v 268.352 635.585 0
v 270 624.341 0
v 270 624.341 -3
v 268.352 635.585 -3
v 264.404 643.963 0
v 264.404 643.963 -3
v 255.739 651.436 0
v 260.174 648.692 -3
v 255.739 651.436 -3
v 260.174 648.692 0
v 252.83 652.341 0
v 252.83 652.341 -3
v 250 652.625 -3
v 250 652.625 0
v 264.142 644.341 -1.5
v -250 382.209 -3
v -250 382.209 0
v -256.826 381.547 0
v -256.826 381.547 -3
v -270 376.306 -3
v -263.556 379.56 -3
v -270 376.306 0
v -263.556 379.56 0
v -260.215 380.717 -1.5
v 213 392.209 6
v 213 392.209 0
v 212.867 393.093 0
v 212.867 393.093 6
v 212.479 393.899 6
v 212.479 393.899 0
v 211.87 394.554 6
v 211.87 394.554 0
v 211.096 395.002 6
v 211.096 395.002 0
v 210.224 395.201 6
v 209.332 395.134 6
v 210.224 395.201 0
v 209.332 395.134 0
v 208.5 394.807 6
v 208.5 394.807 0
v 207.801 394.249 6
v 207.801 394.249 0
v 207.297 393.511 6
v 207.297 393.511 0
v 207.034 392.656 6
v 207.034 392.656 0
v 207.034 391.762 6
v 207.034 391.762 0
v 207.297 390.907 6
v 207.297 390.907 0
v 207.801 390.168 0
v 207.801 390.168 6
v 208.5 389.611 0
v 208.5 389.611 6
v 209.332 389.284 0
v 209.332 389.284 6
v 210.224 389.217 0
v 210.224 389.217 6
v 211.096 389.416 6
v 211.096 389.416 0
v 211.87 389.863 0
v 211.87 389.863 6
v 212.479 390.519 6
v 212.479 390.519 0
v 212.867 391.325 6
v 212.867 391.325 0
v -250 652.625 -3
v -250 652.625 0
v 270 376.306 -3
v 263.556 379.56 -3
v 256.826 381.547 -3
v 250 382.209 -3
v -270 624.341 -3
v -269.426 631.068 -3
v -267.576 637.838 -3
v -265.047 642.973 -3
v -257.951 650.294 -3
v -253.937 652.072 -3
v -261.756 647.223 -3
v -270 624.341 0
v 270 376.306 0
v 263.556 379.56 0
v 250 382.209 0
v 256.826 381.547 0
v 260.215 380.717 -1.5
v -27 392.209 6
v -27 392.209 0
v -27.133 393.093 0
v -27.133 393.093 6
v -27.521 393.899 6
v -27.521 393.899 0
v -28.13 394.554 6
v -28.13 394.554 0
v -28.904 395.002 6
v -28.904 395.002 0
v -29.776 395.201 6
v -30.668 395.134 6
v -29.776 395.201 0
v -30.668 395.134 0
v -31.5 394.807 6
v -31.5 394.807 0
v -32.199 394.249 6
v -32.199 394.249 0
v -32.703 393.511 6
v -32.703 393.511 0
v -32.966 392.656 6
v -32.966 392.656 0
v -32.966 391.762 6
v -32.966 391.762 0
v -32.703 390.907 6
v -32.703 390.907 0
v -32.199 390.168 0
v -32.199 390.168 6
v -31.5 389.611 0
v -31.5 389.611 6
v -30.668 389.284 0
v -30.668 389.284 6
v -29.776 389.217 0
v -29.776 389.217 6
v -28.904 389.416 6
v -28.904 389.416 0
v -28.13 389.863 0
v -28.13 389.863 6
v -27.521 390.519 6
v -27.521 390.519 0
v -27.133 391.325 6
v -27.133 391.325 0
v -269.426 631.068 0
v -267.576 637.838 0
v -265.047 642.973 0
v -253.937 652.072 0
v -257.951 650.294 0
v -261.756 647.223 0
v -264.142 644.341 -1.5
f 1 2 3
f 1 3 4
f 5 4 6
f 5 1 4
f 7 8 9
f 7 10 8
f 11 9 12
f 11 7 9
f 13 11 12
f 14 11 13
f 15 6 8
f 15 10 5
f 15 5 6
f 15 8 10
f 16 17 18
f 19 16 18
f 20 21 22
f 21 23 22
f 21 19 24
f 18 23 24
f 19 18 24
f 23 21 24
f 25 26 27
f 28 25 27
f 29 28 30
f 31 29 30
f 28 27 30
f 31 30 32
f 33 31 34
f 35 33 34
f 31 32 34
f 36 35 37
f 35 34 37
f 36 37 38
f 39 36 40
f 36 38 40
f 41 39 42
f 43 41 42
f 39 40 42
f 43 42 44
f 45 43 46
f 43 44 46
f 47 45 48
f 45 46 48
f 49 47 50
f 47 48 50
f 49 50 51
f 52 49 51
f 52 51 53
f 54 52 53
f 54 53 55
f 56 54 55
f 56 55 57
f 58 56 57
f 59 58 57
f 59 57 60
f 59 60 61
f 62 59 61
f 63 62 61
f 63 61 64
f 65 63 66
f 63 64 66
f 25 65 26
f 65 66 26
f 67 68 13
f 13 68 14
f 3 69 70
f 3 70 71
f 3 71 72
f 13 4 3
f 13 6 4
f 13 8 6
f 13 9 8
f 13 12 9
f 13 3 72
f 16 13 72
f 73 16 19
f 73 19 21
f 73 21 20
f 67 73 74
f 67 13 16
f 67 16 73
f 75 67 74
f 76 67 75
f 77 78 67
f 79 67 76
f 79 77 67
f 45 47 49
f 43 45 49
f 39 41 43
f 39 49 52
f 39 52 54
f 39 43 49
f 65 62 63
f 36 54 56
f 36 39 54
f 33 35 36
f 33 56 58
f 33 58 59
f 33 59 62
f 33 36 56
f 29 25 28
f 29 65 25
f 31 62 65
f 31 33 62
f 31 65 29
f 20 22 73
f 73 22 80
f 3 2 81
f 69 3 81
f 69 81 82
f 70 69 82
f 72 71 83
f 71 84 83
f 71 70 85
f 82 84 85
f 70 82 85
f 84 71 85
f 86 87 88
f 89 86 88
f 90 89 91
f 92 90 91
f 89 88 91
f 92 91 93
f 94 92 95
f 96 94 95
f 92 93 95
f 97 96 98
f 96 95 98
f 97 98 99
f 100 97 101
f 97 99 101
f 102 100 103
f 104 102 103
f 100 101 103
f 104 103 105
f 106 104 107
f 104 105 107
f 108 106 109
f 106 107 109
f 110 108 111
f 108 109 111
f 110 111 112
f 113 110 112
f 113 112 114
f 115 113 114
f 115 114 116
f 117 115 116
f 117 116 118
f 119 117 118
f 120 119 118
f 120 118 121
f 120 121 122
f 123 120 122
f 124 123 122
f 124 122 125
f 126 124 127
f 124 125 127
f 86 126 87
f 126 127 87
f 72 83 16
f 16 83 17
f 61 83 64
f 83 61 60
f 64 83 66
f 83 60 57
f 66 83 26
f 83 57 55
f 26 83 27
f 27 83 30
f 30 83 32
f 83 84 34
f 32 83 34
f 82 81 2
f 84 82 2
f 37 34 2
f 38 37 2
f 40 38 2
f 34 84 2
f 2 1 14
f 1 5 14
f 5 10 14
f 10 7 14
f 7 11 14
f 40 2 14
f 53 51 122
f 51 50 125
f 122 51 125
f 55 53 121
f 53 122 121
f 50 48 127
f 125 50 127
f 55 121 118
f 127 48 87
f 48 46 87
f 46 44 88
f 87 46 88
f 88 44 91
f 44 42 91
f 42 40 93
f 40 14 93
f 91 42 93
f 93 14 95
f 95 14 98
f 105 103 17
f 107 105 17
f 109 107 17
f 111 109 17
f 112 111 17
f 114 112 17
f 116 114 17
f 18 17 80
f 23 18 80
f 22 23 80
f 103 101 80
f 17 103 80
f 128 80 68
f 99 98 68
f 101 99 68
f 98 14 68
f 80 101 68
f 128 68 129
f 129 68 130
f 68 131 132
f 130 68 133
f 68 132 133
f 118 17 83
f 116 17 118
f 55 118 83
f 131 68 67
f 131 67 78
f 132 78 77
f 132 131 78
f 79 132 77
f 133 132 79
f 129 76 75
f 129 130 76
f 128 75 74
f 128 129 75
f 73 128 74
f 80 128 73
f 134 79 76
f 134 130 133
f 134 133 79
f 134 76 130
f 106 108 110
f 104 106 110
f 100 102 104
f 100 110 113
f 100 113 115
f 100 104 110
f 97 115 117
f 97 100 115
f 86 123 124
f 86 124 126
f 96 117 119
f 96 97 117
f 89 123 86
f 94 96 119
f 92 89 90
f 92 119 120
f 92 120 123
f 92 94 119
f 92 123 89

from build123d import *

# Parameters (mm, degrees)
BOSS_EXTRUDE1_DEPTH = 3
SKETCH2_R           = 3
BOSS_EXTRUDE2_DEPTH = 6


with BuildPart() as part:
    # Sketch1 → Boss-Extrude1 (new body)
    with BuildSketch(Plane.XY):
        with BuildLine():
            Line((250, 382.208907076), (-250, 382.208907076))
            add(Edge.make_bspline(
                [(-250, 382.208907076), (-260.435607626, 382.208907076), (-270, 376.305635941)],
                knots=[0, 0, 0, 0.411516846, 0.411516846, 0.411516846], degree=2, weights=[1, 0.978906313, 1]))
            Line((-270, 376.305635941), (-270, 624.340941432))
            add(Edge.make_bspline(
                [(-250, 652.625212679), (-270, 652.625212679), (-270, 624.340941432)],
                knots=[0, 0, 0, 1.570796327, 1.570796327, 1.570796327], degree=2, weights=[1, 0.707106781, 1]))
            Line((-250, 652.625212679), (250, 652.625212679))
            add(Edge.make_bspline(
                [(270, 624.340941432), (270, 652.625212679), (250, 652.625212679)],
                knots=[1.570796327, 1.570796327, 1.570796327, 3.141592654, 3.141592654, 3.141592654], degree=2, weights=[1, 0.707106781, 1]))
            Line((270, 624.340941432), (270, 376.305635941))
            add(Edge.make_bspline(
                [(270, 376.305635941), (260.435607626, 382.208907076), (250, 382.208907076)],
                knots=[2.730075808, 2.730075808, 2.730075808, 3.141592654, 3.141592654, 3.141592654], degree=2, weights=[1, 0.978906313, 1]))
        make_face()
    extrude(amount=-BOSS_EXTRUDE1_DEPTH)

    # Sketch2 → Boss-Extrude2 (add)
    with BuildSketch(Plane.XY):
        with Locations((-30, 392.208907076)):
            Circle(SKETCH2_R)
        with Locations((210, 392.208907076)):
            Circle(SKETCH2_R)
    extrude(amount=BOSS_EXTRUDE2_DEPTH)


solid = part.part
